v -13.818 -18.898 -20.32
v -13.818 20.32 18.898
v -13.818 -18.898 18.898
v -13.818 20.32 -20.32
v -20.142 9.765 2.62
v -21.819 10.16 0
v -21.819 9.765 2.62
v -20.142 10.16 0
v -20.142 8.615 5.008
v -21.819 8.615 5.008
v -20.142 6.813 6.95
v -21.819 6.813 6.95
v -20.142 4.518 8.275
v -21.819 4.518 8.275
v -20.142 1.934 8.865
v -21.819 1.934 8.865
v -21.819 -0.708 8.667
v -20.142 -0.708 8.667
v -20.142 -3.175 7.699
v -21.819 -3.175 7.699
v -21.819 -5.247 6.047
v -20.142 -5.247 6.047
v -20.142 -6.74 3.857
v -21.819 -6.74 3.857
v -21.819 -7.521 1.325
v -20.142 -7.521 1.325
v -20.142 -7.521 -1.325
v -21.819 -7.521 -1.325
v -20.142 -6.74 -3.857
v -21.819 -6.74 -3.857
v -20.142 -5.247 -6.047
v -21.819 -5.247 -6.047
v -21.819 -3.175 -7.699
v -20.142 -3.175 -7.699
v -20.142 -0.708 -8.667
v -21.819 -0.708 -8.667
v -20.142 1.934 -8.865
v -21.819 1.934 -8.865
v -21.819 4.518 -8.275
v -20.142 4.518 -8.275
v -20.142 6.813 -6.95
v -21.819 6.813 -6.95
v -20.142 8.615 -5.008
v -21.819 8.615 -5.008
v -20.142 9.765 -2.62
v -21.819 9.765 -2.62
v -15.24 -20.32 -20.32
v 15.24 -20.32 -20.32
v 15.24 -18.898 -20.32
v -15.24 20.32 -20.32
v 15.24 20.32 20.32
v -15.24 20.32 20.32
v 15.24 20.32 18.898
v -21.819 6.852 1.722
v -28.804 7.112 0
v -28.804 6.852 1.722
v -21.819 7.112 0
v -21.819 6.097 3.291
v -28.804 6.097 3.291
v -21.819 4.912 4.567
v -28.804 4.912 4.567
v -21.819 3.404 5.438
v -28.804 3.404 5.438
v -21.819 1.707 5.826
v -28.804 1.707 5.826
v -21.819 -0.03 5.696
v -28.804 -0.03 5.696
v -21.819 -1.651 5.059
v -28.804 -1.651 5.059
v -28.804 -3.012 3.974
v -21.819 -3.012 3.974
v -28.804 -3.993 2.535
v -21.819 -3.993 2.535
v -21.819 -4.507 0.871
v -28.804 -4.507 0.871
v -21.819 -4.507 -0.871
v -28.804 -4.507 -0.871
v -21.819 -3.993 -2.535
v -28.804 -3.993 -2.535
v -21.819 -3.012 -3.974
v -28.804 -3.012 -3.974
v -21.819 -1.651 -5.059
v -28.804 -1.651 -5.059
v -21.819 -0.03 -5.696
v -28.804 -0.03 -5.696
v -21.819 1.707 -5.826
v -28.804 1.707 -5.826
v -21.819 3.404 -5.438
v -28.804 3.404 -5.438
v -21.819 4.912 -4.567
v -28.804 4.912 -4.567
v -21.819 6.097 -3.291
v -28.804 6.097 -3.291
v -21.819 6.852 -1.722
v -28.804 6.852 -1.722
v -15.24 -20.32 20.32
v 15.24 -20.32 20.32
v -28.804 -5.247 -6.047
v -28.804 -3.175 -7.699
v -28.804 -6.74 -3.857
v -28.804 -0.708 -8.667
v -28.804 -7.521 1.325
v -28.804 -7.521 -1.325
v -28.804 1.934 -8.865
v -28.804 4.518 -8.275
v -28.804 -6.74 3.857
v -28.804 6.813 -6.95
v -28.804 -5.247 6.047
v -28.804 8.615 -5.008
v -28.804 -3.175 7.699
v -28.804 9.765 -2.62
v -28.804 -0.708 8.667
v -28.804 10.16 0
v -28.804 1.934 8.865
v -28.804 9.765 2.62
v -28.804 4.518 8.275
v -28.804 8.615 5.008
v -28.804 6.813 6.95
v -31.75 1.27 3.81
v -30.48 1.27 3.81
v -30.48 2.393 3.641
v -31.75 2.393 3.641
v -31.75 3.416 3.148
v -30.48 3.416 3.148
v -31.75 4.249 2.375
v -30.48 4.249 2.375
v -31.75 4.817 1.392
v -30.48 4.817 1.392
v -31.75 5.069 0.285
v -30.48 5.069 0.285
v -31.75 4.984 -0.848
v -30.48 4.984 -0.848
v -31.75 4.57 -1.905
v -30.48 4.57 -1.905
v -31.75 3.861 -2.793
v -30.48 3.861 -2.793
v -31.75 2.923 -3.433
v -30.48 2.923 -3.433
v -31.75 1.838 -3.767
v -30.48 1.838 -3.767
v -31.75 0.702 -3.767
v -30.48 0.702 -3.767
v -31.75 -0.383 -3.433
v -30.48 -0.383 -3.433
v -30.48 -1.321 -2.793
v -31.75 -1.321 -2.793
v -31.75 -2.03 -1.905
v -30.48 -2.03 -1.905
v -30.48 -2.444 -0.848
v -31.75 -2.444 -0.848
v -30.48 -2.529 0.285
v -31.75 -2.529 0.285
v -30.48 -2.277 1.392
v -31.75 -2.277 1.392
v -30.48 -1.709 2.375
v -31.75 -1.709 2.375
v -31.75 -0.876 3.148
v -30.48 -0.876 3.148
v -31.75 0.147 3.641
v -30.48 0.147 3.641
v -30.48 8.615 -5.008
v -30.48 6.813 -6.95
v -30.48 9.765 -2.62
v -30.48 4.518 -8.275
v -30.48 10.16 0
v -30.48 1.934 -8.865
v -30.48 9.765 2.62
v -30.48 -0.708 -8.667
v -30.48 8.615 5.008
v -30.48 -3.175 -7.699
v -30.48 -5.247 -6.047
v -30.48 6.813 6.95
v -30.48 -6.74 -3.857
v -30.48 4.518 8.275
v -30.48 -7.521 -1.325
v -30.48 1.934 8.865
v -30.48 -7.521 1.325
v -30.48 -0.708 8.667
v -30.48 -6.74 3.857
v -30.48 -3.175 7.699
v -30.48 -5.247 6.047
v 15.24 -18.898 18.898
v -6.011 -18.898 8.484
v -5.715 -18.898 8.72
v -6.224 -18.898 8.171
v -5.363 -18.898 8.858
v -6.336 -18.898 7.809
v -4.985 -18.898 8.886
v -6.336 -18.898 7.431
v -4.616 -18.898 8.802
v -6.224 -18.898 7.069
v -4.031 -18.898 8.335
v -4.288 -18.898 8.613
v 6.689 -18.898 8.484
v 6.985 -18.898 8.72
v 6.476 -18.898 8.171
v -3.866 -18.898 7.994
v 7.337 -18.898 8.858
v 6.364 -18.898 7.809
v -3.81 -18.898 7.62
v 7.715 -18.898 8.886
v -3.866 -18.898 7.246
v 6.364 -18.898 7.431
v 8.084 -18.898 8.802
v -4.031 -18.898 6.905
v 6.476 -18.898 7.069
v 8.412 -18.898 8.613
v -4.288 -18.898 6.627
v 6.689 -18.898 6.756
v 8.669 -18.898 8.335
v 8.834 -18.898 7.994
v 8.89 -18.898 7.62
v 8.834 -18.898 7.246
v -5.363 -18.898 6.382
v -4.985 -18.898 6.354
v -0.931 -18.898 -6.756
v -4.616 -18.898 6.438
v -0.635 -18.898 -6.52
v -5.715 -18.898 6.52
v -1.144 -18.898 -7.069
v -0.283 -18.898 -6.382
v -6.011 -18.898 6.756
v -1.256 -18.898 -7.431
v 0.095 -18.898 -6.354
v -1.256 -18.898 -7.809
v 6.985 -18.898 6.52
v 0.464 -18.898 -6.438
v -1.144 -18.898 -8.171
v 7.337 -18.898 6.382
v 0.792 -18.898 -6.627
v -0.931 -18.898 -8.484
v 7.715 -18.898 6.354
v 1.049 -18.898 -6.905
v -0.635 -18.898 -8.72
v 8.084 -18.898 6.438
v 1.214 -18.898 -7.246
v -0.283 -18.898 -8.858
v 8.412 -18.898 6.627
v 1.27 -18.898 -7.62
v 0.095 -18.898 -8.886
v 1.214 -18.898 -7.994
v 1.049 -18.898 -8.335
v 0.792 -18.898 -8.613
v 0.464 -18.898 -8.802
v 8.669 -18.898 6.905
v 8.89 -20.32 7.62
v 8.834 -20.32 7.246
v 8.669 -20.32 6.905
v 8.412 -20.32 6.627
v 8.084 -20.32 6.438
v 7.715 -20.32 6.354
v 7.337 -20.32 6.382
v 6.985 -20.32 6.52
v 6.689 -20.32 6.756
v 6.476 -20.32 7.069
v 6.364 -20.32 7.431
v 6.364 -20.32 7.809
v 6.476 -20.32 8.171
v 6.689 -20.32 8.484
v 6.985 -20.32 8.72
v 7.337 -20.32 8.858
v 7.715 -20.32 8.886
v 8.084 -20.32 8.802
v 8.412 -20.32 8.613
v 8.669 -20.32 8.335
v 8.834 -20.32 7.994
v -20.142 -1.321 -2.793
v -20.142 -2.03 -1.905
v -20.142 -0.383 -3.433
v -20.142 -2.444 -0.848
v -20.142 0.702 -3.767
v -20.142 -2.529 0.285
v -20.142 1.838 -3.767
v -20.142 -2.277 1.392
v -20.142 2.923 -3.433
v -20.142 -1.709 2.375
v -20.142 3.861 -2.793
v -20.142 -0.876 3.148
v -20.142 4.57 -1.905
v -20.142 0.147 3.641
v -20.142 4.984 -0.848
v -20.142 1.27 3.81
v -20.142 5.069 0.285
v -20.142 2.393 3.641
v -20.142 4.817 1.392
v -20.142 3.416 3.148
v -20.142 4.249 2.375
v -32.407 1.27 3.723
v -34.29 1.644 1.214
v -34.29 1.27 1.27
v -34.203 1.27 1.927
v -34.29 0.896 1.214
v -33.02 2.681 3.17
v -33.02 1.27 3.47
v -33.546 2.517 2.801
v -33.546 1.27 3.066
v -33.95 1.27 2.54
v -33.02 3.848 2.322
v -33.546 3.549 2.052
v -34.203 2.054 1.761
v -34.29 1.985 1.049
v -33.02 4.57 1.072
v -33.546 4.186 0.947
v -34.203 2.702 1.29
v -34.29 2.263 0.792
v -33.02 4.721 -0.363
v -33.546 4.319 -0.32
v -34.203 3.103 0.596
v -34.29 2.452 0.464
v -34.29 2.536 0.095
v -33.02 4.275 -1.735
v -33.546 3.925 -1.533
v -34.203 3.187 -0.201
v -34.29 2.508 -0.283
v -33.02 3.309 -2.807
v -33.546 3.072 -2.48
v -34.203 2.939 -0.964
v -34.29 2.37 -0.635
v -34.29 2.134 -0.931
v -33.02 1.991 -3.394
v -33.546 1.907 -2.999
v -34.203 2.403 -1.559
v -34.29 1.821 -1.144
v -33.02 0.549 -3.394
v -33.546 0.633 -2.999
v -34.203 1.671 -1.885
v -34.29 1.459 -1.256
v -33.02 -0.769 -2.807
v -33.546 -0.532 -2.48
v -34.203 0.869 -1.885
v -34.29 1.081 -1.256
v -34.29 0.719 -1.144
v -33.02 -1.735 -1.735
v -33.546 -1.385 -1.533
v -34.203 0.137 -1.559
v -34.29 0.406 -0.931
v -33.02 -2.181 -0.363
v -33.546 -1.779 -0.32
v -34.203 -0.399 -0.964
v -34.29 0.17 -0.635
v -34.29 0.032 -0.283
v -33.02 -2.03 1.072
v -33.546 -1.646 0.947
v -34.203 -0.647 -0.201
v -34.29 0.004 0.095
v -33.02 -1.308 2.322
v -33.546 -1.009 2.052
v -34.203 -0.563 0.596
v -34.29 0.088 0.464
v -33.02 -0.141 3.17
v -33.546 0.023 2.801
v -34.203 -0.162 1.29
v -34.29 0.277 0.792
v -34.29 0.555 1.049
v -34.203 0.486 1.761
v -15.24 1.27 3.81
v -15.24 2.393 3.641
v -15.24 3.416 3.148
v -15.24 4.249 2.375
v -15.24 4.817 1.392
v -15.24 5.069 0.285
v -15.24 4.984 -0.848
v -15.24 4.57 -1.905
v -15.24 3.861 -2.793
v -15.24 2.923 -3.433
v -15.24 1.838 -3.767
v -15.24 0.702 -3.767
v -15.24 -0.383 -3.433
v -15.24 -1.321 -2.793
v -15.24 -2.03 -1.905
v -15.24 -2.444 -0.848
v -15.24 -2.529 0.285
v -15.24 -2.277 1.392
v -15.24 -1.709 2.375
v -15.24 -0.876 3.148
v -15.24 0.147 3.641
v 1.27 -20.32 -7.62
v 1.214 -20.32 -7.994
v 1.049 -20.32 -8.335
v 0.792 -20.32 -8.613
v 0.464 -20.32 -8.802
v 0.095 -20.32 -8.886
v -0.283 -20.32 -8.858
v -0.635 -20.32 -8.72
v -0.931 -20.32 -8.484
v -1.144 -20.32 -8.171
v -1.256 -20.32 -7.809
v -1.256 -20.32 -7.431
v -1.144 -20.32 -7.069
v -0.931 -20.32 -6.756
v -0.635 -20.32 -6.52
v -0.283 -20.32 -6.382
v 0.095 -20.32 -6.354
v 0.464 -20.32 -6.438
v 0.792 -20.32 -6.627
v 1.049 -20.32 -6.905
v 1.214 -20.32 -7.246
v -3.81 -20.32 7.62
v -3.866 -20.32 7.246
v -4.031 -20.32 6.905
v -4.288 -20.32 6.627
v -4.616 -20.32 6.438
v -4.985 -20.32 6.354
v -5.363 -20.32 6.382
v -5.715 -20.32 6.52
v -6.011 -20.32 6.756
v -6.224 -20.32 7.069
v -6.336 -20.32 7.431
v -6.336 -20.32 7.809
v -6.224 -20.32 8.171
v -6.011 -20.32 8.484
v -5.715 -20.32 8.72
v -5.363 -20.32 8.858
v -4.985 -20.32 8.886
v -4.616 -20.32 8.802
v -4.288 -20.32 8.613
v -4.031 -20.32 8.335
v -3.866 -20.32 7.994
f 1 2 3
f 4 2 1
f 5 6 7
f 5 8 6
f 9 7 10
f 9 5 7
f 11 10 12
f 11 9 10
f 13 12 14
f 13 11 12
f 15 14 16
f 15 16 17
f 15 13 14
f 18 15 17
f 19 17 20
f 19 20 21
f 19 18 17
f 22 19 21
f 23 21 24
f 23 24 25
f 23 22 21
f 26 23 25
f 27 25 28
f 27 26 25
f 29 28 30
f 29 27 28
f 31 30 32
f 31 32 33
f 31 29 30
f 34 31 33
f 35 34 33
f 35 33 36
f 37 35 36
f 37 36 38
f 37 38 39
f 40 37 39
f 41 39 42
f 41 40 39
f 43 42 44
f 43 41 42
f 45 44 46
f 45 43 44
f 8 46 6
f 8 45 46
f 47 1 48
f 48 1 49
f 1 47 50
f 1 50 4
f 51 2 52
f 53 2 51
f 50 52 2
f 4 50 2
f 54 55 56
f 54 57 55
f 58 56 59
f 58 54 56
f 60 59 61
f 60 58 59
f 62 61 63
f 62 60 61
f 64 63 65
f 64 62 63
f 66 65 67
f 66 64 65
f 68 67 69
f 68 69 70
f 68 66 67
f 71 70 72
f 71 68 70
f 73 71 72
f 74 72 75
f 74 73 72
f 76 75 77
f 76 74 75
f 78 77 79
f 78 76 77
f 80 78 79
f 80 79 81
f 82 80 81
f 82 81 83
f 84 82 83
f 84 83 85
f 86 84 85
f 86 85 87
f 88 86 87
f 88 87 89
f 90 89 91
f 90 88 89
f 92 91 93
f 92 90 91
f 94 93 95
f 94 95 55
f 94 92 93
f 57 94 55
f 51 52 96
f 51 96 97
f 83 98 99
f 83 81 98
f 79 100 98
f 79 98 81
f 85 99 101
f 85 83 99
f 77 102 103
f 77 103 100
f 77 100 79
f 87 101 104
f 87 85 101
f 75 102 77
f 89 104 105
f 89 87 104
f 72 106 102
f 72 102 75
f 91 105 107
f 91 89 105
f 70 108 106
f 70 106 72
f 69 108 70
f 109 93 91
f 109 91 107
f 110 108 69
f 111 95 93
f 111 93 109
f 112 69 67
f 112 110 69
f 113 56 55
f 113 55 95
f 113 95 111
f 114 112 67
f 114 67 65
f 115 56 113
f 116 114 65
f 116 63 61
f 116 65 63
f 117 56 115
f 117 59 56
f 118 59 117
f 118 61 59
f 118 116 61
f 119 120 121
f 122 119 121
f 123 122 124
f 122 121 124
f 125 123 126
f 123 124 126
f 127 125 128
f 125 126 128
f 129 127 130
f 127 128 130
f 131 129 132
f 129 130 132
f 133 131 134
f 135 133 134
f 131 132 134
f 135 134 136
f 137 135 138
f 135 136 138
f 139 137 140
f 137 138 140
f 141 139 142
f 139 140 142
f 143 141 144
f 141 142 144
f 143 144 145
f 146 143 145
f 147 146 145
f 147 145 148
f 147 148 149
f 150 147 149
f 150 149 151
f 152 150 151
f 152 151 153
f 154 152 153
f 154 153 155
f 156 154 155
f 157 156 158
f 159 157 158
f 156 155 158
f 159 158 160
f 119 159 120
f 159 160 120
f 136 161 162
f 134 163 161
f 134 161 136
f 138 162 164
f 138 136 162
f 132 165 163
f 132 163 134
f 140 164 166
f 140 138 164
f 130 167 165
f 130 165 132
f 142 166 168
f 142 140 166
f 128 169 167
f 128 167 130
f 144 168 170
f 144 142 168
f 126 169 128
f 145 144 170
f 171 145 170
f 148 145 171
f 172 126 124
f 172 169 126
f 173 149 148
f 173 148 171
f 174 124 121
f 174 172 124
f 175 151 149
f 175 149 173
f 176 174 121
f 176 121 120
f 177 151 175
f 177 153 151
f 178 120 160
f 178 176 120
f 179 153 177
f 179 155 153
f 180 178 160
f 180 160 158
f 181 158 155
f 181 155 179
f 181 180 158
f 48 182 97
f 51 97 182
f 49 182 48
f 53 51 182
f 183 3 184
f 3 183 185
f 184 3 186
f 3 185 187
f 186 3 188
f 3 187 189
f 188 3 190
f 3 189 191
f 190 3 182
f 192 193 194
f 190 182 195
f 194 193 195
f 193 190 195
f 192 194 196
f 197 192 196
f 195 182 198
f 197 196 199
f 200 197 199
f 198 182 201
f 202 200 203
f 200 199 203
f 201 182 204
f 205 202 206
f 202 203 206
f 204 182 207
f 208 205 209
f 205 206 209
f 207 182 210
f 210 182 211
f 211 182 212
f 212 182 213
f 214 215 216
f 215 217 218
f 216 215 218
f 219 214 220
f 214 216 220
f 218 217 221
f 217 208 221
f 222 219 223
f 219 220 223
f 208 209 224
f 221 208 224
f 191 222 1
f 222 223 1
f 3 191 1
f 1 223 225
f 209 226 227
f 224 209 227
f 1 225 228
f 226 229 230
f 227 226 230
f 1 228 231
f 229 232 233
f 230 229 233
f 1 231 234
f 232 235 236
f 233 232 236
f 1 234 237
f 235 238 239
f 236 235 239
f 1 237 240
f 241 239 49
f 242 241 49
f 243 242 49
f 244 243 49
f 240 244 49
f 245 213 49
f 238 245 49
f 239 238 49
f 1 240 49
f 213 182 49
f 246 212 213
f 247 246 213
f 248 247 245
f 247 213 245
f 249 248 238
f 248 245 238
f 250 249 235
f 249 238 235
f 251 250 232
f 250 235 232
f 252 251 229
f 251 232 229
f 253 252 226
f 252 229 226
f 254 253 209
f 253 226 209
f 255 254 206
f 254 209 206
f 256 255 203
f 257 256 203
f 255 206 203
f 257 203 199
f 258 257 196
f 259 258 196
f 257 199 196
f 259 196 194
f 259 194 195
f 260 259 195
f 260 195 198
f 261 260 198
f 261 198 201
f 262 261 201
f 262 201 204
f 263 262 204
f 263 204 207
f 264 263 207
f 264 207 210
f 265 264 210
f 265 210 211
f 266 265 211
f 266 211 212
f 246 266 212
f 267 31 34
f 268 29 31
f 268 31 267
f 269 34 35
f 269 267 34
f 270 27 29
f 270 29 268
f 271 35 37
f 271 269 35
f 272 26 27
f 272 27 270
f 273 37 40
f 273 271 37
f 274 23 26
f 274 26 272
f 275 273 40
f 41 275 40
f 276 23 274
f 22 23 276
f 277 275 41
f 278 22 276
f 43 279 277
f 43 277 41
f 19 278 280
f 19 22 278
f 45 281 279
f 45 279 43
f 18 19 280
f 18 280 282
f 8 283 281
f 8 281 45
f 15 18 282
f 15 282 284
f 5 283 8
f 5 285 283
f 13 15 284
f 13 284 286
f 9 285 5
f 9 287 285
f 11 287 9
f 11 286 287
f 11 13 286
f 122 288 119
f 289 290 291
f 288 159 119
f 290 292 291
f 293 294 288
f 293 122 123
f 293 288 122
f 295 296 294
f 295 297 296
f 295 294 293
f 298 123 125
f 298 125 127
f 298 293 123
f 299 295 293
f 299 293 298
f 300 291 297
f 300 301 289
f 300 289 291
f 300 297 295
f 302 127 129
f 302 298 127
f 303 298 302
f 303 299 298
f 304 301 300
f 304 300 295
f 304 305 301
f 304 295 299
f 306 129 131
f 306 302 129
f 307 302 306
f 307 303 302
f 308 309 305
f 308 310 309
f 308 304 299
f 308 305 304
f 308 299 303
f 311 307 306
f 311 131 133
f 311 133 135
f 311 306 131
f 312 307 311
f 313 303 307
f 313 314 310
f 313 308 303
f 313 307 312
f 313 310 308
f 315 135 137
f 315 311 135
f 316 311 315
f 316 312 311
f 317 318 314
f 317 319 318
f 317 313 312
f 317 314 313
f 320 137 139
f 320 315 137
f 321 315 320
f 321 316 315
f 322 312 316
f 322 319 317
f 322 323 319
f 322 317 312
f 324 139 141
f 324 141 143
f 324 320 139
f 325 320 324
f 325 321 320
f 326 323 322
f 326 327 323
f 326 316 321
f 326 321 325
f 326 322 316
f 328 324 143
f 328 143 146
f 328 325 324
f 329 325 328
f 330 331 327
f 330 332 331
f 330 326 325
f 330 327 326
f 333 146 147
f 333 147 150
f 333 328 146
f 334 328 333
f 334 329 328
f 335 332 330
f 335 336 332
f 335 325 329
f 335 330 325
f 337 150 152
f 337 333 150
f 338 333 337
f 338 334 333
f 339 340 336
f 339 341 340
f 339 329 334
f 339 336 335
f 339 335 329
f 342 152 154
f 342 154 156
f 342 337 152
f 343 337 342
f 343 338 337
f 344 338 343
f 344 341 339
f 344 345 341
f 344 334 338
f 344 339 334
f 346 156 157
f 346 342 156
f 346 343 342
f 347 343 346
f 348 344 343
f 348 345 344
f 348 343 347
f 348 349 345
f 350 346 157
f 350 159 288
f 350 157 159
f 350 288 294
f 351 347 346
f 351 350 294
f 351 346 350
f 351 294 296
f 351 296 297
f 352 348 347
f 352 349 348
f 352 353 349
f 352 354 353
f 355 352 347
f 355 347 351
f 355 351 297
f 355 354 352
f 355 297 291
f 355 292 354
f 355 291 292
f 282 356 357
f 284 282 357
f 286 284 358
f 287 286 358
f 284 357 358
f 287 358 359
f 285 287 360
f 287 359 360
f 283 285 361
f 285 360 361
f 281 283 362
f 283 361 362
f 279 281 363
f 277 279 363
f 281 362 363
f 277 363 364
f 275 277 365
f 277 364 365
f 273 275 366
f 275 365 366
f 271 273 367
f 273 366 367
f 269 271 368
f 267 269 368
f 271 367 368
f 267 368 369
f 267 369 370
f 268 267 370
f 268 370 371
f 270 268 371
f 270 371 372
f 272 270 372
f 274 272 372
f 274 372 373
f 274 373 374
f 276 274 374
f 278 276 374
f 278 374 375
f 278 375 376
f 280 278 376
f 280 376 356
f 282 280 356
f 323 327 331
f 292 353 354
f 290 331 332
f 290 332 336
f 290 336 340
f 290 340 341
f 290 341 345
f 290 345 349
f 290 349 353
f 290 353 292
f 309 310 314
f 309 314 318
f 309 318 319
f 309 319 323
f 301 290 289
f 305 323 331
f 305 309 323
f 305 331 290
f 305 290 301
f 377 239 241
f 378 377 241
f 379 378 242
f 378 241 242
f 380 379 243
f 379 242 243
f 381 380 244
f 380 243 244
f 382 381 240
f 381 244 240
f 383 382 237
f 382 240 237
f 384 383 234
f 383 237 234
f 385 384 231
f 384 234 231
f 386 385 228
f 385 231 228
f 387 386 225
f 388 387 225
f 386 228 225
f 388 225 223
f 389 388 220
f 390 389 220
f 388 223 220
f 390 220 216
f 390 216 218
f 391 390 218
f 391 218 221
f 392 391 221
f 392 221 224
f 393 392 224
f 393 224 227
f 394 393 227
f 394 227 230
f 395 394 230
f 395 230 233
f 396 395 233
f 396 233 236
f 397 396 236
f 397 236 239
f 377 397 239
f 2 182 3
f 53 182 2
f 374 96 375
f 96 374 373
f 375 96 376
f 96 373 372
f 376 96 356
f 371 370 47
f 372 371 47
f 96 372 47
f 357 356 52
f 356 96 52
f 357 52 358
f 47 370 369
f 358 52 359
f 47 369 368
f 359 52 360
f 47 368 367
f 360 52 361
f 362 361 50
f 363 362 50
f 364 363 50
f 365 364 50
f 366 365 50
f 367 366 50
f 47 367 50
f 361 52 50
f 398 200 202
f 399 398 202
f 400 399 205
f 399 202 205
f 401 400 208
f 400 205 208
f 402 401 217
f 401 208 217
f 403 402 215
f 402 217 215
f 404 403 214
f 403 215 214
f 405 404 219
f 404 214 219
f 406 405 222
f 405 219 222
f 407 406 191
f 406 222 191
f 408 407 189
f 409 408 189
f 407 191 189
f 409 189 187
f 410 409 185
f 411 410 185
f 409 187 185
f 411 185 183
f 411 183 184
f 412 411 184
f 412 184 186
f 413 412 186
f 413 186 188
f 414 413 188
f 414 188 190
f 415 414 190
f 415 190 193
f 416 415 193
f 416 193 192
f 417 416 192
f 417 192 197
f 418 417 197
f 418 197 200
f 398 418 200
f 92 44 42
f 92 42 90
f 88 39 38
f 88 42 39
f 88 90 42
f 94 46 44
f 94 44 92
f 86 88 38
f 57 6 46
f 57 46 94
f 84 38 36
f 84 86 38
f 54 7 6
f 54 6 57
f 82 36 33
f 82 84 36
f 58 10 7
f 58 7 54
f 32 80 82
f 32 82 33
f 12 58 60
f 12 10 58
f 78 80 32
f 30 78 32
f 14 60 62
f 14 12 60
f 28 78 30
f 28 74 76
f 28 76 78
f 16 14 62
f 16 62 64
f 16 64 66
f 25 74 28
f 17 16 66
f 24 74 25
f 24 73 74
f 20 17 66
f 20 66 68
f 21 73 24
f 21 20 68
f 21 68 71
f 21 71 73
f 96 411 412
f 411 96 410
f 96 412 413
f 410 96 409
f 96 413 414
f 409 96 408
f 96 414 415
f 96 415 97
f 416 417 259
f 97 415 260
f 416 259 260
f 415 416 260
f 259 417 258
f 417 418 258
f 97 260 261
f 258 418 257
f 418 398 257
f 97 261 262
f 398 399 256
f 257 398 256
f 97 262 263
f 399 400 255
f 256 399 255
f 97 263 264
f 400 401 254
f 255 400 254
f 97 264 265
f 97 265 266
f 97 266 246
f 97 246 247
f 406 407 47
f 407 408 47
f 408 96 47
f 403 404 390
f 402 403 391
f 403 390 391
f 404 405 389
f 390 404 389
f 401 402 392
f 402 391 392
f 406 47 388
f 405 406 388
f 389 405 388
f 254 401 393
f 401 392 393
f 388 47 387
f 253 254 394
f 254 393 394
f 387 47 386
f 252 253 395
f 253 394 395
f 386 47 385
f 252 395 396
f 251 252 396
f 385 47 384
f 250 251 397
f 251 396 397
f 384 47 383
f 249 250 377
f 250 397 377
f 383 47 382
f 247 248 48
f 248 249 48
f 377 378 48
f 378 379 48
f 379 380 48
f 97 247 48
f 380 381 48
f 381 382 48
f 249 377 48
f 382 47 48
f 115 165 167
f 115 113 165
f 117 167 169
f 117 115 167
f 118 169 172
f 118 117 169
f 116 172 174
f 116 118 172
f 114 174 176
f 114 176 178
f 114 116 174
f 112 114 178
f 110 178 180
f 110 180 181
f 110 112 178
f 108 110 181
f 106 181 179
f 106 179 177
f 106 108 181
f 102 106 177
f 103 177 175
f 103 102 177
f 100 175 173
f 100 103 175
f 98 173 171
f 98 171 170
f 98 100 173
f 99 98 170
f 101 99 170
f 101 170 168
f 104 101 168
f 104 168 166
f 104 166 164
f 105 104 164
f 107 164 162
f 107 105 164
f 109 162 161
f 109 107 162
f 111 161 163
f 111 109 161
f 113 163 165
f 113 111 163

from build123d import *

# Parameters (mm, degrees)
SKETCH1_W           = 30.48
SKETCH1_H           = 40.64
BOSS_EXTRUDE1_DEPTH = 20.32
SKETCH2_W           = 39.2176
SKETCH2_H           = 39.2176
CUT_EXTRUDE1_DEPTH  = 29.0576
SKETCH3_R           = 1.27
CUT_EXTRUDE2_DEPTH  = 2.4224
SKETCH4_R           = 3.81
BOSS_EXTRUDE2_DEPTH = 19.05
FILLET1_R           = 2.54


with BuildPart() as part:
    # Sketch1 → Boss-Extrude1 (new body, symmetric)
    with BuildSketch(Plane(origin=(0, 0, 0), x_dir=(1, 0, 0), z_dir=(0, 1, 0))):
        Rectangle(SKETCH1_W, SKETCH1_H)
    extrude(amount=BOSS_EXTRUDE1_DEPTH, both=True)

    # Sketch2 → Cut-Extrude1 (cut)
    with BuildSketch(Plane(origin=(15.24, 0, 0), x_dir=(0, 0, -1), z_dir=(1, 0, 0))):
        with Locations((0.7112, 0.7112)):
            Rectangle(SKETCH2_W, SKETCH2_H)
    extrude(amount=-CUT_EXTRUDE1_DEPTH, mode=Mode.SUBTRACT)

    # Sketch3 → Cut-Extrude2 (cut, through all)
    with BuildSketch(Plane(origin=(0, -18.8976, 0), x_dir=(1, 0, 0), z_dir=(0, 1, 0))):
        with Locations((-5.08, -7.62)):
            Circle(SKETCH3_R)
        with Locations((7.62, -7.62)):
            Circle(SKETCH3_R)
        with Locations((0, 7.62)):
            Circle(SKETCH3_R)
    extrude(amount=-CUT_EXTRUDE2_DEPTH, mode=Mode.SUBTRACT)

    # Sketch4 → Boss-Extrude2 (add)
    with BuildSketch(Plane.ZY.offset(15.24)):
        with Locations((0, 1.27)):
            Circle(SKETCH4_R)
    extrude(amount=BOSS_EXTRUDE2_DEPTH)

    # Sketch5 → Revolve1 (revolve)
    with BuildSketch(Plane.XY):
        Polygon((-30.48, 5.08), (-30.48, 10.16), (-28.8036, 10.16), (-28.8036, 7.112), (-21.8186, 7.112), (-21.8186, 10.16), (-20.1422, 10.16), (-20.1422, 5.08), align=None)
    revolve(axis=Axis((-34.29, 1.27, 0), (1, 0, 0)))

    # Fillet1
    fillet1_edges = [part.edges().sort_by_distance(p)[0] for p in [
        (-34.29, 1.27, -3.81),
    ]]
    fillet(fillet1_edges, radius=FILLET1_R)


solid = part.part
